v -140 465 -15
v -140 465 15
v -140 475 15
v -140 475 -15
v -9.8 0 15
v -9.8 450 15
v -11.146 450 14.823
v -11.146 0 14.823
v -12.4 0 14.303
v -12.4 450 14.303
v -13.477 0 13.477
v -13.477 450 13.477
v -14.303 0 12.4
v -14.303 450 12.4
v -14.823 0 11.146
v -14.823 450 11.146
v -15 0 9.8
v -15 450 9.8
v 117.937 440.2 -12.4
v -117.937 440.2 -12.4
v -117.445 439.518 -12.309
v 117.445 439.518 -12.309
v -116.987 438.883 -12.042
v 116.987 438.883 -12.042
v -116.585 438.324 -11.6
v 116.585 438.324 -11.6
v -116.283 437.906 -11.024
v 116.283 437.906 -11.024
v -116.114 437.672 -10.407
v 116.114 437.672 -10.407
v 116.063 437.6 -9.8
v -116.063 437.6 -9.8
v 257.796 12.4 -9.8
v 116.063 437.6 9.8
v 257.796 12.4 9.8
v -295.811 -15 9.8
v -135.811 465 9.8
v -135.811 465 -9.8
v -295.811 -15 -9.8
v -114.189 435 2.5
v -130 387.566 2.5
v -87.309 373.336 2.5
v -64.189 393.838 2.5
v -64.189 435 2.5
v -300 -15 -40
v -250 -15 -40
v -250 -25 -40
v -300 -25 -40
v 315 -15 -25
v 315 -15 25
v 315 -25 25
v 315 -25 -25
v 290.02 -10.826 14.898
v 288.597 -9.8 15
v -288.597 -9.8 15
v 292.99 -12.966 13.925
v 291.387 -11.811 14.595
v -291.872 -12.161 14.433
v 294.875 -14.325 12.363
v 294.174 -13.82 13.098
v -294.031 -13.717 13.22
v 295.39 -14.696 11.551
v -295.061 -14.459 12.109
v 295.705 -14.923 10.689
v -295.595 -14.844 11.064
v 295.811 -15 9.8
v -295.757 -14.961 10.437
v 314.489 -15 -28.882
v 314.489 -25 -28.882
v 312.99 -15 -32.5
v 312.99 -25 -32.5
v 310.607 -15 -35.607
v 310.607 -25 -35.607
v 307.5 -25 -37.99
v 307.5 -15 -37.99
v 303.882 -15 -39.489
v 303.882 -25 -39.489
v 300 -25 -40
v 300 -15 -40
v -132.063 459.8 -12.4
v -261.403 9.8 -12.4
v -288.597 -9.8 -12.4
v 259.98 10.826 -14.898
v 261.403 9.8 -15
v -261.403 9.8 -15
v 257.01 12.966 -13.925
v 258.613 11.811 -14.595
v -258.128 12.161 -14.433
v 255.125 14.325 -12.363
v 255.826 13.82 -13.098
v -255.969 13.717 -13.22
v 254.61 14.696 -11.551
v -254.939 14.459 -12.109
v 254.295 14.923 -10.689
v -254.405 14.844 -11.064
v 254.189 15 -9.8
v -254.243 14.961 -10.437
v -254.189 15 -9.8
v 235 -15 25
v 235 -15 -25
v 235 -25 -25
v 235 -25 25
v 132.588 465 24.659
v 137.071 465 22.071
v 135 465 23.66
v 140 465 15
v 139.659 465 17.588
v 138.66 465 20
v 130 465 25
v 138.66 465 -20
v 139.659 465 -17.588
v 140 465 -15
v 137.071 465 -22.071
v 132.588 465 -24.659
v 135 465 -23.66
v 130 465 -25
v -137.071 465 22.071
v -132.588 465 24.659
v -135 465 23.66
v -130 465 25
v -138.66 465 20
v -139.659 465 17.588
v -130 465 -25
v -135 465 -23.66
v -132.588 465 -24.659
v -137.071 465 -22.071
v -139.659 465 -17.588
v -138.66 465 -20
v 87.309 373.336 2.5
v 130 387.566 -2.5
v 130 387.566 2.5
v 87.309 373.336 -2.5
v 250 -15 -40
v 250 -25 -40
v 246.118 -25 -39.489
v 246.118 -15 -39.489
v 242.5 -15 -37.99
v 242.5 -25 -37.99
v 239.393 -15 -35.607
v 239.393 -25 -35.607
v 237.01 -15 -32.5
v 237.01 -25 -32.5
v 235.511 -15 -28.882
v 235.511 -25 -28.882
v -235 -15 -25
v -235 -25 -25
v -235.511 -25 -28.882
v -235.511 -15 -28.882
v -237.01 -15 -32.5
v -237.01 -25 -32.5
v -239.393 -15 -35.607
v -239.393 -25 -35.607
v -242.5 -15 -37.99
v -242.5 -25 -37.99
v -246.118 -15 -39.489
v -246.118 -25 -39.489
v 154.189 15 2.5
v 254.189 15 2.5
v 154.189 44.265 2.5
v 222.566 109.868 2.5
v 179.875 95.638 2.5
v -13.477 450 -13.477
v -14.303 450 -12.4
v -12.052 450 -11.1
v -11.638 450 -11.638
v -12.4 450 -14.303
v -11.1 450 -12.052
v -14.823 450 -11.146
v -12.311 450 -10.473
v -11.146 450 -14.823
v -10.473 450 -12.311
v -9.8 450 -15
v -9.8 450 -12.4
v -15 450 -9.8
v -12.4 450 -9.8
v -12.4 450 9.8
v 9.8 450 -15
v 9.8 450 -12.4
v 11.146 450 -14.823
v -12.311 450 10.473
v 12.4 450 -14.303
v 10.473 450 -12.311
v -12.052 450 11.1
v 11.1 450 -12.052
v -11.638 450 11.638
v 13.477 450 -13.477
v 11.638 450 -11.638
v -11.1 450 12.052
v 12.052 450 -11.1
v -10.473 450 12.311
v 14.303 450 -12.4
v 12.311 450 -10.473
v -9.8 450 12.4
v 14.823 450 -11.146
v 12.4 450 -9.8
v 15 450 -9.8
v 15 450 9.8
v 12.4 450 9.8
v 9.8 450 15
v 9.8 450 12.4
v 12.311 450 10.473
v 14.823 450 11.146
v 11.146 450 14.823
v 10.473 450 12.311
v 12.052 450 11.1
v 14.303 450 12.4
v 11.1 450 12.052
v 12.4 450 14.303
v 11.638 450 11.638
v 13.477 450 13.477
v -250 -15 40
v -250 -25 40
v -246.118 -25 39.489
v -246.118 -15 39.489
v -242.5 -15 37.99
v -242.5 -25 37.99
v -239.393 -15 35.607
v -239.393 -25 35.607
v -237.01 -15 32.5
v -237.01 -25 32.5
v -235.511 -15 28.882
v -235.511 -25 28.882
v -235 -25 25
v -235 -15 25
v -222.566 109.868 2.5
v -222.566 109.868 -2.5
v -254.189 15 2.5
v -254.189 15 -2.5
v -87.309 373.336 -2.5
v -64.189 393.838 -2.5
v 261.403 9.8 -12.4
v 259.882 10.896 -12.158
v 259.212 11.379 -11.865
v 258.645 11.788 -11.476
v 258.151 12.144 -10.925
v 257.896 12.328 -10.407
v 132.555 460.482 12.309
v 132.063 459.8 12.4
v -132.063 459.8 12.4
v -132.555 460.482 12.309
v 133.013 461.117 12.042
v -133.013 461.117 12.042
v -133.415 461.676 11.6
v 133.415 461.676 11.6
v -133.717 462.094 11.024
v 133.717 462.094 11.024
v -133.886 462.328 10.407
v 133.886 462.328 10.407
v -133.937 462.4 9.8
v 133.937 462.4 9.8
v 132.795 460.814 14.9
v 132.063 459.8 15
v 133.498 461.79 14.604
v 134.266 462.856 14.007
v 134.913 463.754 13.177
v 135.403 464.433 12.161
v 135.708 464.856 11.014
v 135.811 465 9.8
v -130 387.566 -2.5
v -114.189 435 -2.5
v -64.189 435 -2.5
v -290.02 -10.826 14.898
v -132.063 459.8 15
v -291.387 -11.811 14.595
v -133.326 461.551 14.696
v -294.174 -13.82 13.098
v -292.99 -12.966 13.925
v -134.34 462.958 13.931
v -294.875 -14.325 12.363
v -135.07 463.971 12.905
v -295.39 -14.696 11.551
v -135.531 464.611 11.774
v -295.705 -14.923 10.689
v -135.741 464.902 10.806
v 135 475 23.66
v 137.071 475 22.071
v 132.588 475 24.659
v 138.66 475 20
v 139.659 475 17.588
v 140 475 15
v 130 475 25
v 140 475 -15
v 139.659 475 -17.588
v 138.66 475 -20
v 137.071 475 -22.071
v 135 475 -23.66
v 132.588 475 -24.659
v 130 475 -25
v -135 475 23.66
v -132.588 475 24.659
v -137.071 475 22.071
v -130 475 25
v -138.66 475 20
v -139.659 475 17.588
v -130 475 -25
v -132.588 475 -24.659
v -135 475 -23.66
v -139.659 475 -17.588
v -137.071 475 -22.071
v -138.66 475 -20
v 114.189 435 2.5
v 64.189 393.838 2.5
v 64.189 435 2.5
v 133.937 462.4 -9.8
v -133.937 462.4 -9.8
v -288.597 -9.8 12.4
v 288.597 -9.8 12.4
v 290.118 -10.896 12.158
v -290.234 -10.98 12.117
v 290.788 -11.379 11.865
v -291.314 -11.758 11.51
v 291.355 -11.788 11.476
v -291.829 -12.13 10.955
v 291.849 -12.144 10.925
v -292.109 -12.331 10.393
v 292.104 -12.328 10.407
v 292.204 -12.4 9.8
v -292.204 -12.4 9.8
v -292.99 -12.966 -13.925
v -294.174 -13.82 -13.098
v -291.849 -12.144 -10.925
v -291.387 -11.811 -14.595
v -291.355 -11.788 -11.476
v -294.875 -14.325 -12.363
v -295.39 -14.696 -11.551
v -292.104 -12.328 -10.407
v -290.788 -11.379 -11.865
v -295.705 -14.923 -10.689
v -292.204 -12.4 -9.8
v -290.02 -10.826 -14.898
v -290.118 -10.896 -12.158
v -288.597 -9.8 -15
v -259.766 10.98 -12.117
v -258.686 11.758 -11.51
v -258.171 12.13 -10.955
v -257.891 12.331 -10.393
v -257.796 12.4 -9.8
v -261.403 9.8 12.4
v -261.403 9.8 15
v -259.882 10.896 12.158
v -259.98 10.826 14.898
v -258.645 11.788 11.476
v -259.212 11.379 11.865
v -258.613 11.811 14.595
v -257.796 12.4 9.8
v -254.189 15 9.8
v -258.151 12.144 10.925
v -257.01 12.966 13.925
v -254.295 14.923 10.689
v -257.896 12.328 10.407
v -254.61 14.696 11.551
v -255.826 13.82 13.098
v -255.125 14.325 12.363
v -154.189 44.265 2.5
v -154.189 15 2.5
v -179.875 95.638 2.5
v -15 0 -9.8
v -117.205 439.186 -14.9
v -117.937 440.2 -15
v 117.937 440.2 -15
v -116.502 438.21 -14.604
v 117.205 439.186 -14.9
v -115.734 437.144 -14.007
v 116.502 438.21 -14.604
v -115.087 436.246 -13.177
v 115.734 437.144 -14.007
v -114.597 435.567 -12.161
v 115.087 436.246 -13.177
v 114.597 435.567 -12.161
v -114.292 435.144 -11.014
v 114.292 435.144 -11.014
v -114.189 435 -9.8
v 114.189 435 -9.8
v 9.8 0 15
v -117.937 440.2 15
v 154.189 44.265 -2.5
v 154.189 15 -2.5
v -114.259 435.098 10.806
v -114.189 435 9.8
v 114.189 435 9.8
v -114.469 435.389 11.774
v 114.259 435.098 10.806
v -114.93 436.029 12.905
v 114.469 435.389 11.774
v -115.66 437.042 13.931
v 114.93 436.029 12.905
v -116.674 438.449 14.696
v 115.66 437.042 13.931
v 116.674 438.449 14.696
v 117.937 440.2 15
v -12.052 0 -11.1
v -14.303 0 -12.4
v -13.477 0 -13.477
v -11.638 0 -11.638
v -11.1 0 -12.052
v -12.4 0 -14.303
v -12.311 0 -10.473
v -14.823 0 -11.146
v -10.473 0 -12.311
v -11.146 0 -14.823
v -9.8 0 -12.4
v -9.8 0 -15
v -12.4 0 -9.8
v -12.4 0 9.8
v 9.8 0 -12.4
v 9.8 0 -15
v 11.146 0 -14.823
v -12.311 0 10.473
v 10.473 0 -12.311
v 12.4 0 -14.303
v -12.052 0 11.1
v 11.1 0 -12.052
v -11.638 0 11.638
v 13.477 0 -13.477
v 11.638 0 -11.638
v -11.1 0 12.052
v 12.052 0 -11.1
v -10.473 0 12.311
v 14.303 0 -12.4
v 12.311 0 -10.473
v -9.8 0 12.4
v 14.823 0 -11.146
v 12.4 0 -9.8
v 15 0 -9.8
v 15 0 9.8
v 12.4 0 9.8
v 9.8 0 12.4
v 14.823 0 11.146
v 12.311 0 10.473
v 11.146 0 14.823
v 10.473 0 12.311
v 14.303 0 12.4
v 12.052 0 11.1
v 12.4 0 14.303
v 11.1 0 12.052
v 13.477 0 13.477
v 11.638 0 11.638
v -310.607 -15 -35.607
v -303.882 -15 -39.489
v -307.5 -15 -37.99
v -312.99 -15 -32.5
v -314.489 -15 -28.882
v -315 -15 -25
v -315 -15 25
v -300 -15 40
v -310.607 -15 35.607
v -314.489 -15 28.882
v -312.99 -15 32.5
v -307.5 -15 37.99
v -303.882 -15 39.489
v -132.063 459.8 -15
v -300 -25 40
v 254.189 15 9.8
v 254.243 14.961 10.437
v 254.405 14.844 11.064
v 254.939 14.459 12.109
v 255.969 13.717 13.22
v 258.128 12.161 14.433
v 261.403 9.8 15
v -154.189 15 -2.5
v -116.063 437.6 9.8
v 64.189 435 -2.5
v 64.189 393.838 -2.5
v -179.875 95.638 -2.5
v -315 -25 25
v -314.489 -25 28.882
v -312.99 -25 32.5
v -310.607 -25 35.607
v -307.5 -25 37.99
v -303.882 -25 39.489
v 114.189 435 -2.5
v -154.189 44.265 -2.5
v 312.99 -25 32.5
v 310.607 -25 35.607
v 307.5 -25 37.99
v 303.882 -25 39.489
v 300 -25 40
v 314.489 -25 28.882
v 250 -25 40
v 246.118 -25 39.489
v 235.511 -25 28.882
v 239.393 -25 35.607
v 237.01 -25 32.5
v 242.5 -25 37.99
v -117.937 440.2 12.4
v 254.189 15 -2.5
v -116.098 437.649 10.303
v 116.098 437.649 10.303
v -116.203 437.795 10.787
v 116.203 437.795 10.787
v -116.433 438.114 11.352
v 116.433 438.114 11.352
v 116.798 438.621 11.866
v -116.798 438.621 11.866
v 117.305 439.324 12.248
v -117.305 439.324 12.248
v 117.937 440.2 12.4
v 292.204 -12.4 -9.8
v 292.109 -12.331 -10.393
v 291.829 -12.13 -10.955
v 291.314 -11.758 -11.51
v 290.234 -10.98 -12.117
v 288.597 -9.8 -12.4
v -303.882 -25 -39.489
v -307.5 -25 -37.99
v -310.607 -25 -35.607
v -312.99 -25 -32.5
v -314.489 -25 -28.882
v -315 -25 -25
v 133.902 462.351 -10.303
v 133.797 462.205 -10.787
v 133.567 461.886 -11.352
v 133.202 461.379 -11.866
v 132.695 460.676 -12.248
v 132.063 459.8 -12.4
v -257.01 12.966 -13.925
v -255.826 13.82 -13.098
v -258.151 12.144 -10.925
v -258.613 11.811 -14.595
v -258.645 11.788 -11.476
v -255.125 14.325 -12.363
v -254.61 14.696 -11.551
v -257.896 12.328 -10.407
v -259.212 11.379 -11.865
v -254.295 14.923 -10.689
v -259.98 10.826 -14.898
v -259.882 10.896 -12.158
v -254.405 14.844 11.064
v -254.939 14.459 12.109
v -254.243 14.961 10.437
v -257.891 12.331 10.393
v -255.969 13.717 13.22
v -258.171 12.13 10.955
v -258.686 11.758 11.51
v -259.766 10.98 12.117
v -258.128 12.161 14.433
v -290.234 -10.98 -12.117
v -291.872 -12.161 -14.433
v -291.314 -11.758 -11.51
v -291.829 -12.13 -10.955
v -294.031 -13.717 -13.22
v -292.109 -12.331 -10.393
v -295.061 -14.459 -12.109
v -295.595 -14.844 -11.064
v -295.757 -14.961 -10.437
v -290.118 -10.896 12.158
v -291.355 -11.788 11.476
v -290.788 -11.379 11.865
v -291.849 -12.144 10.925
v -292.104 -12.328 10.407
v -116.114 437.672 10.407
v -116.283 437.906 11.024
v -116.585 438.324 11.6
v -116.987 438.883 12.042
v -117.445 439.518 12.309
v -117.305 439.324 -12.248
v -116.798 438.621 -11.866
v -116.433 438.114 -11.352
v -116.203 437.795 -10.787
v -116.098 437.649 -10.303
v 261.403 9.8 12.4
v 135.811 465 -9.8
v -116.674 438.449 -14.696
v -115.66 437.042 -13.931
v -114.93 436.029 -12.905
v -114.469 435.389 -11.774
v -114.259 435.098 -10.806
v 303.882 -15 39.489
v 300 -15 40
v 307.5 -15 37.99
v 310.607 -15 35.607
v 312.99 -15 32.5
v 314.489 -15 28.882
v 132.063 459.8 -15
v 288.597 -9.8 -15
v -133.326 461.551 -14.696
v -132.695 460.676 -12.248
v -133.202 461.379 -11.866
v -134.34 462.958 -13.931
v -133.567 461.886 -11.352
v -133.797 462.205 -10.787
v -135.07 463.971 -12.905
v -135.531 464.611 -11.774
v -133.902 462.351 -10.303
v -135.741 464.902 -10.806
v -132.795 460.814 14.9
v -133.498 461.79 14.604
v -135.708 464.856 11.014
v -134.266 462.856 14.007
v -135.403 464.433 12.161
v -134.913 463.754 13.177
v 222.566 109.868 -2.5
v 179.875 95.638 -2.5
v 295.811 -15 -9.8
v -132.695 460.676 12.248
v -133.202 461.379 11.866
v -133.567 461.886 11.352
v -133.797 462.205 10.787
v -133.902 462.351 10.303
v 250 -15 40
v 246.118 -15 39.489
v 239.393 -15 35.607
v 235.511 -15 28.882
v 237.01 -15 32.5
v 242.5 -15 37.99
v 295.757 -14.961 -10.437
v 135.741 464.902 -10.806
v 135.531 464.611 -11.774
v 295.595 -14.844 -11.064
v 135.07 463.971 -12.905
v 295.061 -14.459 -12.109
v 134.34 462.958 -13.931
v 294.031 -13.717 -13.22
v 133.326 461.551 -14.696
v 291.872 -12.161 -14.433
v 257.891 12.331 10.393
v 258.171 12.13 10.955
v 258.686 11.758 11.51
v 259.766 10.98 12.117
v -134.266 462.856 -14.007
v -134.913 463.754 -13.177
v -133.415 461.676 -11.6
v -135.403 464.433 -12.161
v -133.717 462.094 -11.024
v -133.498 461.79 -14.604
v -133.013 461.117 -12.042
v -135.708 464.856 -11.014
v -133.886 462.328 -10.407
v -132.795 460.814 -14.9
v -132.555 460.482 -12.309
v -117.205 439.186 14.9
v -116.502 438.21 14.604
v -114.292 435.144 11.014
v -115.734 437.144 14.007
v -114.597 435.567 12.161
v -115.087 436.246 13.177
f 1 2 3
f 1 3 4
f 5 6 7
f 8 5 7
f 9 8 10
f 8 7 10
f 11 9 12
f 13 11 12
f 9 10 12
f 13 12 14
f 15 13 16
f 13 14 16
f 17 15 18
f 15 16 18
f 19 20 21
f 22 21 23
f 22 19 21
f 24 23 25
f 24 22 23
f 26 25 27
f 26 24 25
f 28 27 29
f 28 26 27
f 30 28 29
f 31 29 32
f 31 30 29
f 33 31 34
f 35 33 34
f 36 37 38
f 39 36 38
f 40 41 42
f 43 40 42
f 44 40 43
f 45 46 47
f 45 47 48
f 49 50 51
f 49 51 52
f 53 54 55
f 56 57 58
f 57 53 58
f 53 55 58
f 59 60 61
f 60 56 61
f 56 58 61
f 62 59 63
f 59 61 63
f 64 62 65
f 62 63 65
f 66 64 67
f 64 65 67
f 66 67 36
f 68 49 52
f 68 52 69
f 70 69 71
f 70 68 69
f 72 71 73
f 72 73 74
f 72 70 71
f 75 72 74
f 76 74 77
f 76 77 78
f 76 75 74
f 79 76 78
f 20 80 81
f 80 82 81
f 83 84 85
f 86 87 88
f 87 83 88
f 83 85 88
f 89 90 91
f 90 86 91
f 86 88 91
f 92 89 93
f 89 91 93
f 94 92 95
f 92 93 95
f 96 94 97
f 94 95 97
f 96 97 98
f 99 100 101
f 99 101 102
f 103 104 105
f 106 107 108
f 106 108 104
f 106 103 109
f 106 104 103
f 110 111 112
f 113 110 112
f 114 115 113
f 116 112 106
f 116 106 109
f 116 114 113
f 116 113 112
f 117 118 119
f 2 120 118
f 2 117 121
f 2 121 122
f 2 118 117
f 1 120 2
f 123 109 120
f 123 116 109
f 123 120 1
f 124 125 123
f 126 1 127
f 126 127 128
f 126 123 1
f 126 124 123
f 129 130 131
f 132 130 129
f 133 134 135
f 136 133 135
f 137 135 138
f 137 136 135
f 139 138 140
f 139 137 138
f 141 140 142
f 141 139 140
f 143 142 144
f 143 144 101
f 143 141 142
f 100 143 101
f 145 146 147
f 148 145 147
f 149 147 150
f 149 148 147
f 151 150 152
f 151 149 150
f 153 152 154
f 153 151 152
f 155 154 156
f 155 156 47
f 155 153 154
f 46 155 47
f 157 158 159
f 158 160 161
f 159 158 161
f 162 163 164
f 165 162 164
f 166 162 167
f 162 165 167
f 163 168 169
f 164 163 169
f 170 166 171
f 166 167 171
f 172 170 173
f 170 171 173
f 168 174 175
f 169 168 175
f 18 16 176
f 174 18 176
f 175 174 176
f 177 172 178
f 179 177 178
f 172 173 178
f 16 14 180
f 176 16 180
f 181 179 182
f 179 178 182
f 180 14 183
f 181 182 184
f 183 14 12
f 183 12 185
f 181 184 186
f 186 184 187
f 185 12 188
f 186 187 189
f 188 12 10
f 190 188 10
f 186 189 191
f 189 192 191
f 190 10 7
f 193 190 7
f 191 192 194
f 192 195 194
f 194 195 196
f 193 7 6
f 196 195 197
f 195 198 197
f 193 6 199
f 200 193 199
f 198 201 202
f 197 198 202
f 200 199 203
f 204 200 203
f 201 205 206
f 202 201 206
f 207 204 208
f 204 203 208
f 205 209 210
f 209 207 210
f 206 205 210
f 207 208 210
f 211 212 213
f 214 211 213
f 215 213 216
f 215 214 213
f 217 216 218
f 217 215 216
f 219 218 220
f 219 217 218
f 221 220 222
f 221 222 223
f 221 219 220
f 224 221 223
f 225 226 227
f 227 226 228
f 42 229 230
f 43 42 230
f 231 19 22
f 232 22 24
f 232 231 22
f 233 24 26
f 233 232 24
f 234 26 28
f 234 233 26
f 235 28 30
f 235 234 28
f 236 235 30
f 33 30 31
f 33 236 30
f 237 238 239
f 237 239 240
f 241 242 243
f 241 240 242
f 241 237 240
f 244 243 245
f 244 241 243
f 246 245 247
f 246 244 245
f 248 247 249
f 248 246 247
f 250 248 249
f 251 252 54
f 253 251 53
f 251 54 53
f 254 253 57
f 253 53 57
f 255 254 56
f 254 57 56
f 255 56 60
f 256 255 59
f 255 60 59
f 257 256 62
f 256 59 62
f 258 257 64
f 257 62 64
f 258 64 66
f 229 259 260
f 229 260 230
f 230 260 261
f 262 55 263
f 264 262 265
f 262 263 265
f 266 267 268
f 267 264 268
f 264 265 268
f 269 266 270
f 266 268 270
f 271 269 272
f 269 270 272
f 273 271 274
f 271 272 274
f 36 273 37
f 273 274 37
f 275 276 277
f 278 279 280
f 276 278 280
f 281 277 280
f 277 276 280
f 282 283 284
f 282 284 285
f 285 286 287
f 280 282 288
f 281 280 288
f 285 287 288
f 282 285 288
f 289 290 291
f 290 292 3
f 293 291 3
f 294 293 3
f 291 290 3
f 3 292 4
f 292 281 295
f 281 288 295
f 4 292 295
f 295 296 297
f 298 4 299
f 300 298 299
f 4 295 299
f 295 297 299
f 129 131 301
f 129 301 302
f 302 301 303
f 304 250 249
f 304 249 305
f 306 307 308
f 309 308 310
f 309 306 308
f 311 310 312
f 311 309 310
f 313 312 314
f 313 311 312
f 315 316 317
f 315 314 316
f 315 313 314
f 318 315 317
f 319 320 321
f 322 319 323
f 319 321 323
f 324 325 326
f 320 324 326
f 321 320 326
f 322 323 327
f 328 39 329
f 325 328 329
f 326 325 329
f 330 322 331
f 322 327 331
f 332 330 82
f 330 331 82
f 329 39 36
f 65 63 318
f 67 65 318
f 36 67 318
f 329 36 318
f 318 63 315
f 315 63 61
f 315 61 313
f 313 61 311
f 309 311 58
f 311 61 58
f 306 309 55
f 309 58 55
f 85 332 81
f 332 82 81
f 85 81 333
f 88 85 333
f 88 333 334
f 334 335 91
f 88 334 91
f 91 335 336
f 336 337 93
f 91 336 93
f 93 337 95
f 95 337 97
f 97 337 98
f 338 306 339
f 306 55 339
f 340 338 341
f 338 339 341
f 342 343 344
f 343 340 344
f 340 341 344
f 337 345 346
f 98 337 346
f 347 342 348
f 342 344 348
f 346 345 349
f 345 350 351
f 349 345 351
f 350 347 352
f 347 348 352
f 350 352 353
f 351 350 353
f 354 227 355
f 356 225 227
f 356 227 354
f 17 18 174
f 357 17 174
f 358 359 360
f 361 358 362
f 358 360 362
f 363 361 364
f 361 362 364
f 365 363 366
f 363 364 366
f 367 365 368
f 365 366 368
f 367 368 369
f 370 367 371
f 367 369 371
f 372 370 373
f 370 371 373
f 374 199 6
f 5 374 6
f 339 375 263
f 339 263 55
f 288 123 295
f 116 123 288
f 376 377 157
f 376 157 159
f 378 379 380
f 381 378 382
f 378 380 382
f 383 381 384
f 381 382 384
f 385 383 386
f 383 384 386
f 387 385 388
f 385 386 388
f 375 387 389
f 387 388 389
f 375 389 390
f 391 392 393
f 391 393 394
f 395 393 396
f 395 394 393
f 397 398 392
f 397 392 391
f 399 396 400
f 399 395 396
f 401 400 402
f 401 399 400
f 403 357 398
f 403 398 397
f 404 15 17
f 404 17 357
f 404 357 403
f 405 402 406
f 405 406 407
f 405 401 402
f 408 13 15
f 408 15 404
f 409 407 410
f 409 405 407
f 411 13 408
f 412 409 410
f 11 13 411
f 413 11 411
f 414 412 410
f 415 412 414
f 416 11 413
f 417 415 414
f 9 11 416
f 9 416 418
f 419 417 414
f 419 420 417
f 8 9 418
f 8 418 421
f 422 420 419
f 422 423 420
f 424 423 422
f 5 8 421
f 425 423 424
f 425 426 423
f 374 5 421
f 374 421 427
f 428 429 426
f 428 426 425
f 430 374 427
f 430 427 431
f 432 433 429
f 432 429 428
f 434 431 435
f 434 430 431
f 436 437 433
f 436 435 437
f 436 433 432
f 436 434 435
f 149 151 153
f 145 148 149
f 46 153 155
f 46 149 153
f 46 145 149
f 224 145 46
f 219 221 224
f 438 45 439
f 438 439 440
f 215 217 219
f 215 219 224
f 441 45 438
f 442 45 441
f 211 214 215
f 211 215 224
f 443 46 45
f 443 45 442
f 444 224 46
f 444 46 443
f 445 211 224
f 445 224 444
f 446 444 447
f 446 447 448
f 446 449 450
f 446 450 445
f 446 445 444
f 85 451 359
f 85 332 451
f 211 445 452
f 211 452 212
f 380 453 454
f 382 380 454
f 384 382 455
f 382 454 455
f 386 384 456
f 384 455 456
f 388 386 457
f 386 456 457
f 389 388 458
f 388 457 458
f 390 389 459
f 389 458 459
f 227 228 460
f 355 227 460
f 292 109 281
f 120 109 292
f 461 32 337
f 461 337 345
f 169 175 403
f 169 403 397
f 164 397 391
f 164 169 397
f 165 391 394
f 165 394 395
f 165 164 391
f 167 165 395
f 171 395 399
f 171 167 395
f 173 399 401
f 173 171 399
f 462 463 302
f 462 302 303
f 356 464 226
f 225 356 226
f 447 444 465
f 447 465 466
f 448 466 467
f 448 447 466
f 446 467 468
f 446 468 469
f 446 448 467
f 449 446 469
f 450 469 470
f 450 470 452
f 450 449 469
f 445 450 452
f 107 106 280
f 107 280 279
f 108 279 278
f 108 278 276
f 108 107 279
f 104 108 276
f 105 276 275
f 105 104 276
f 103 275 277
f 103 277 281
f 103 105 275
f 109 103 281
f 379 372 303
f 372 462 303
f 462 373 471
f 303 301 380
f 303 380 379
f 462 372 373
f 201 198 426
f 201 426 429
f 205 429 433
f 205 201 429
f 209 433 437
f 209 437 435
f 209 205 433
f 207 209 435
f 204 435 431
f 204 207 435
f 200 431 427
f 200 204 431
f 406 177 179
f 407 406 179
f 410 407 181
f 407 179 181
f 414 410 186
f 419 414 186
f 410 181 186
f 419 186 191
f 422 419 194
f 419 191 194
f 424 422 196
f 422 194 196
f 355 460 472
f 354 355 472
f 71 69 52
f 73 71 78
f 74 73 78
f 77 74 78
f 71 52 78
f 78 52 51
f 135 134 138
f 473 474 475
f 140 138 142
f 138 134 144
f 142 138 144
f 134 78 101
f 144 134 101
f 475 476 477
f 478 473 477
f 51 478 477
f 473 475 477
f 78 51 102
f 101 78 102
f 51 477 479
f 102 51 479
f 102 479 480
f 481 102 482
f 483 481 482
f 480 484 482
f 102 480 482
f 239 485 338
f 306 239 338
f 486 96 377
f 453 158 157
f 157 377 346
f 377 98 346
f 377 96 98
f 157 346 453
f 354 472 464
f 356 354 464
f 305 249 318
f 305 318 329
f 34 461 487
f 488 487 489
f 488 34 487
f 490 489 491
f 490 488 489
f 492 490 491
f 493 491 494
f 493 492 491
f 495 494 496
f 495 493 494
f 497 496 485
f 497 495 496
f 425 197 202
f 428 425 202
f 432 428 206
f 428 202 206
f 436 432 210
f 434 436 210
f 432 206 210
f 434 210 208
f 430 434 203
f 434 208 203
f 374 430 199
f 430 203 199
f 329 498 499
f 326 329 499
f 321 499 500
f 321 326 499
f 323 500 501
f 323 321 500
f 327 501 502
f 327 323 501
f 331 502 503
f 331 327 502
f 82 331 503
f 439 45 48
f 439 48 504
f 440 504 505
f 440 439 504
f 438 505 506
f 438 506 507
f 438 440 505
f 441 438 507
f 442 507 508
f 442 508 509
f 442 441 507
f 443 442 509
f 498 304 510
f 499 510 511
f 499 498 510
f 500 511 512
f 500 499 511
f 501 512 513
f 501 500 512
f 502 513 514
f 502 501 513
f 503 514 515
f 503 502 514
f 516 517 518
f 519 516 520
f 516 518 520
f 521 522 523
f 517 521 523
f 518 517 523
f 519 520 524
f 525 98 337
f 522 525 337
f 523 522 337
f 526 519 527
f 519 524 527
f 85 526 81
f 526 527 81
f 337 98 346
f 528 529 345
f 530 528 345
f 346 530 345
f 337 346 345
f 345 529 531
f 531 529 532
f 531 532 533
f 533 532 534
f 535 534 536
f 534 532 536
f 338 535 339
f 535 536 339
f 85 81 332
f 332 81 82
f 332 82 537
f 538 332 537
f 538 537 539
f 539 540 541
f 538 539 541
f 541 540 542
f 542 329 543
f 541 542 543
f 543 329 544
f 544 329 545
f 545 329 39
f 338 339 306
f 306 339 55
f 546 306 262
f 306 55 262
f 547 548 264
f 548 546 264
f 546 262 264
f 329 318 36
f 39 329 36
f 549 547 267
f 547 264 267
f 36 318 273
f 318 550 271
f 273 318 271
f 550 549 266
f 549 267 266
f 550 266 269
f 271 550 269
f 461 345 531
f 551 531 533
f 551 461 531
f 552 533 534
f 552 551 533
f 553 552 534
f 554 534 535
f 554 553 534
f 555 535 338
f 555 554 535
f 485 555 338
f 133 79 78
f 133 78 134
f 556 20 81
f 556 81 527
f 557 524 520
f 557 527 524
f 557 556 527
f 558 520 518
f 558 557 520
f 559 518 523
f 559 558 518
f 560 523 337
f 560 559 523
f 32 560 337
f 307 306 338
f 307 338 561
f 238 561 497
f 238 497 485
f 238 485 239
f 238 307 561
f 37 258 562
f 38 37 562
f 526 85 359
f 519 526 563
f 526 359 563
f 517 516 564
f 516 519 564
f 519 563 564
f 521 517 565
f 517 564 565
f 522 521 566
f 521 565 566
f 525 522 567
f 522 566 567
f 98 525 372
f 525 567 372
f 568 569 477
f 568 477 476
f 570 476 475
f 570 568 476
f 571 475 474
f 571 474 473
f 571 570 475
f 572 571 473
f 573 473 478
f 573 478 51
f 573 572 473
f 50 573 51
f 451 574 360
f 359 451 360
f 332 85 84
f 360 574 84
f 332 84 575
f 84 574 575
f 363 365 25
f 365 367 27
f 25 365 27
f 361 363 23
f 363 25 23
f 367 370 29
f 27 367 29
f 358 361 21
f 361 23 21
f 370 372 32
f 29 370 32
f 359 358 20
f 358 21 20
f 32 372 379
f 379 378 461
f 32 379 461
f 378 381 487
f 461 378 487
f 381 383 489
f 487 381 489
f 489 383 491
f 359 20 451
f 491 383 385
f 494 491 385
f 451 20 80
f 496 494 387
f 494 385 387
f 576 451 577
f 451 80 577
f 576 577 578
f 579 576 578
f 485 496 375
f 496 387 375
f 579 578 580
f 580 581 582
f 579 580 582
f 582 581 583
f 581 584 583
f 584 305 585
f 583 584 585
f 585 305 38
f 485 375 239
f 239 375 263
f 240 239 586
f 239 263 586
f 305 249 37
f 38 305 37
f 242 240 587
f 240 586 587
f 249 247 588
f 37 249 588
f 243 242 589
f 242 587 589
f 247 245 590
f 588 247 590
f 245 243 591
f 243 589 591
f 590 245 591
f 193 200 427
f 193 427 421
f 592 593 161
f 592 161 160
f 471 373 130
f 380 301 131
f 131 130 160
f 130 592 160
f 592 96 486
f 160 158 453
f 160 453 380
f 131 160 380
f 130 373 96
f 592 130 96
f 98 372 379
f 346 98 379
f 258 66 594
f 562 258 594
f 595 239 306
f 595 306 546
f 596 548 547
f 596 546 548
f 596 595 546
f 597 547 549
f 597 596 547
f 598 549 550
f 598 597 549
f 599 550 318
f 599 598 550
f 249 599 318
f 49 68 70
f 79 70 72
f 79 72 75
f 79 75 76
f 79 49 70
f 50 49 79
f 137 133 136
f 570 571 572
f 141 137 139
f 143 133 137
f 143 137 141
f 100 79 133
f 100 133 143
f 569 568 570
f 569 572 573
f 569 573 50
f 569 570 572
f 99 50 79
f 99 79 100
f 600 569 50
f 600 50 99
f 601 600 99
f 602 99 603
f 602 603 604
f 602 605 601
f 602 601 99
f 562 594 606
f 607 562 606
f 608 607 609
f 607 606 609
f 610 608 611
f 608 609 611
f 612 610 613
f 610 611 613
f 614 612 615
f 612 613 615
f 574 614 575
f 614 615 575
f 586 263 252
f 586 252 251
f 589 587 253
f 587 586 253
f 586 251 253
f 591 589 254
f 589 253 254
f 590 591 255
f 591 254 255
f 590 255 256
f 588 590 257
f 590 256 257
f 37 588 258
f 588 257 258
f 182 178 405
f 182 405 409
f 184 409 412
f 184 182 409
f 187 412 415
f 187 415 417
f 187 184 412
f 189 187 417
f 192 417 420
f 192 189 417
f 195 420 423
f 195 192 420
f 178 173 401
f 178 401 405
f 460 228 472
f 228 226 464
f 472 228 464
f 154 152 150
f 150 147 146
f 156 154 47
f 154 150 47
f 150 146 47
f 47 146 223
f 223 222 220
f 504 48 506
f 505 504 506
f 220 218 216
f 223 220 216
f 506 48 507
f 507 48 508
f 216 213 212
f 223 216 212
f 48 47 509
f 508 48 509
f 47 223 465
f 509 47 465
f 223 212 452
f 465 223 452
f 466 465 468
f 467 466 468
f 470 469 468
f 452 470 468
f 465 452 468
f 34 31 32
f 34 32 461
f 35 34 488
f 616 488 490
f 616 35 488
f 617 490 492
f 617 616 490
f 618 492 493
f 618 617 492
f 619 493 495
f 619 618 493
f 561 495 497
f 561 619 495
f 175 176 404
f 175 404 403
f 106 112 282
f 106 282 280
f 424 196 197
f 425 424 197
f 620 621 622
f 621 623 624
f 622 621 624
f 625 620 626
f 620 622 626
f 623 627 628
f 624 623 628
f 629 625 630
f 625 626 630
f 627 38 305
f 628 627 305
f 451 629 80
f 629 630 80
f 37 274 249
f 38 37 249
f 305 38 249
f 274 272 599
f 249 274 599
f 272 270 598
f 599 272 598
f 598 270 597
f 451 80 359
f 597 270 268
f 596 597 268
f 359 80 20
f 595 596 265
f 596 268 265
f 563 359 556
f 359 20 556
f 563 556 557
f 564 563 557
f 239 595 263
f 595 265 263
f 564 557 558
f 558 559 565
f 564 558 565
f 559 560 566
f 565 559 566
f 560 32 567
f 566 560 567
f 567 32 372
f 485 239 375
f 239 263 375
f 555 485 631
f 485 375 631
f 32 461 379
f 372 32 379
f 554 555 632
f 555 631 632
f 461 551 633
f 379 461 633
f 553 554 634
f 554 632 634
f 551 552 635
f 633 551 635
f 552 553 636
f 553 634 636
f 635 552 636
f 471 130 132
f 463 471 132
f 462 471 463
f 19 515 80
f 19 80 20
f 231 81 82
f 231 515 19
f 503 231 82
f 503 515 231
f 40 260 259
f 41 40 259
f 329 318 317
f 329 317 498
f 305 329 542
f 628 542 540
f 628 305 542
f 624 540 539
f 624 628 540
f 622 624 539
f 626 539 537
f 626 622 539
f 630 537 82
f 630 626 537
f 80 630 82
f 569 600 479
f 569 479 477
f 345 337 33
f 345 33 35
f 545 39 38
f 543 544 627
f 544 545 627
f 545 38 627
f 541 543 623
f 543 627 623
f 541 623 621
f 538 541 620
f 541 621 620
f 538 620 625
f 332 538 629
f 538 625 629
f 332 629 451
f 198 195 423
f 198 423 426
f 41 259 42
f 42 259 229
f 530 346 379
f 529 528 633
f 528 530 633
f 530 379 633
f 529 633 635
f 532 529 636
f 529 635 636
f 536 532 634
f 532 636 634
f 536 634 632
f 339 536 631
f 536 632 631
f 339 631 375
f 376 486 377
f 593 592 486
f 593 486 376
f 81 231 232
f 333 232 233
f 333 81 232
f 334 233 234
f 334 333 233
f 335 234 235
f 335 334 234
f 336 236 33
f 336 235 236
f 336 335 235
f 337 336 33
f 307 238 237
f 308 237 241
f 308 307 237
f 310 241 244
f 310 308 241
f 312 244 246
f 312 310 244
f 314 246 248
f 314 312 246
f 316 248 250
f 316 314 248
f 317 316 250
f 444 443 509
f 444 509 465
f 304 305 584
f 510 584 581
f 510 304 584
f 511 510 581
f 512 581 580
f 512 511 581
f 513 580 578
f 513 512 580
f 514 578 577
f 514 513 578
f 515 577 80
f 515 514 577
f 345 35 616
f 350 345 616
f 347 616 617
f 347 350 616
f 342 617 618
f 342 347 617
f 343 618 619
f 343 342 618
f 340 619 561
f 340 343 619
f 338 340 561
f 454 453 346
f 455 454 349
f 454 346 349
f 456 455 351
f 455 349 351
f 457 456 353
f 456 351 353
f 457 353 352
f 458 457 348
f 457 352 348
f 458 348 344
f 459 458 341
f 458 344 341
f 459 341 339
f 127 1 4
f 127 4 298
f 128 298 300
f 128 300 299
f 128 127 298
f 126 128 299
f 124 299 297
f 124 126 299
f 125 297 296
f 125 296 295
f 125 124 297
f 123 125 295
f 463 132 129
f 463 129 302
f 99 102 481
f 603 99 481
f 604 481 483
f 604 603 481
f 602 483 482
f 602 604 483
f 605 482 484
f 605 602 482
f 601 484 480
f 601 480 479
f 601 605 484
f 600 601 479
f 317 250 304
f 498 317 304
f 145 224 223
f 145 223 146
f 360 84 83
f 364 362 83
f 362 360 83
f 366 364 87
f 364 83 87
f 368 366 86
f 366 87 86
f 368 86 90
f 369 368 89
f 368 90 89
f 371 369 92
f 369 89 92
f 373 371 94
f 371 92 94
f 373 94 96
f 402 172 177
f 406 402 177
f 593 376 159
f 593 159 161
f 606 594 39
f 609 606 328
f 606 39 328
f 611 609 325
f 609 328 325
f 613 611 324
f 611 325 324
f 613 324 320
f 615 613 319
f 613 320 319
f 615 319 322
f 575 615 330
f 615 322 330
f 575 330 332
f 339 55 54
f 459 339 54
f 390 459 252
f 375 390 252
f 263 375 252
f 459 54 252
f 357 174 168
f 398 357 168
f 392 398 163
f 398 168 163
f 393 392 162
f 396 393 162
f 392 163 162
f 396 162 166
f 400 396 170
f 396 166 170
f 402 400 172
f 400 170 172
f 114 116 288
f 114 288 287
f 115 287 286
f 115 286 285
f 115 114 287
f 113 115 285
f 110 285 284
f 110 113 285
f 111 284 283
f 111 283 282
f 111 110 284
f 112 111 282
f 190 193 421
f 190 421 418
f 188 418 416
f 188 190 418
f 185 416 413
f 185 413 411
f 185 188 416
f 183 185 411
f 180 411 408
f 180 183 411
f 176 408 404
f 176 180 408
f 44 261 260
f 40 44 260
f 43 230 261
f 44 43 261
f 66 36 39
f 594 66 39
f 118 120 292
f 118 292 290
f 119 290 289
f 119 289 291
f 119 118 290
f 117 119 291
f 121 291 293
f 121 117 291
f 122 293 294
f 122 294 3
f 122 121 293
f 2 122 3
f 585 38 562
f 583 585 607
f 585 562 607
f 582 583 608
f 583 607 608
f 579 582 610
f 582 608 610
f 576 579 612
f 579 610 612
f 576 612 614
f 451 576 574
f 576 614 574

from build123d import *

# Parameters (mm, degrees)
SQUARE_TUBE_30_X_30_X_2_6_1_DEPTH      = 504.773396612
SQUARE_TUBE_30_X_30_X_2_6_1_DEPTH_BACK = 16.289611963
SQUARE_TUBE_30_X_30_X_2_6_1_2_DEPTH    = 610.863495174
SQUARE_TUBE_30_X_30_X_2_6_1_3_DEPTH    = 521.063008575
SQUARE_TUBE_30_X_30_X_2_6_1_4_DEPTH    = 282.579223926
BOSS_EXTRUDE1_DEPTH                    = 10
BOSS_EXTRUDE1_2_DEPTH                  = 10
BOSS_EXTRUDE2_DEPTH                    = 10
GUSSET1_START                          = -2.5
GUSSET1_DEPTH                          = 5
GUSSET2_START                          = -2.5
GUSSET2_DEPTH                          = 5
SQUARE_TUBE_30_X_30_X_2_6_2_DEPTH      = 450


# Read off the part's stored shape, not the designer's step: Gusset1, Gusset2
with BuildPart() as part:
    # Sketch11 → Square tube 30 X 30 X 2.6(1) (new, two sides: drawn at the far end of the back side and taken through both)
    with BuildSketch(Plane(origin=(-125, 450, 0), x_dir=(0.9486832980505138, -0.3162277660168379, 0), z_dir=(-0.31622776601683794, -0.9486832980505139, 0)).offset(-SQUARE_TUBE_30_X_30_X_2_6_1_DEPTH_BACK)):
        with BuildLine():
            Line((-9.8, -15), (9.8, -15))
            ThreePointArc((9.8, -15), (13.476955262, -13.476955262), (15, -9.8))
            Line((15, -9.8), (15, 9.8))
            ThreePointArc((15, 9.8), (13.476955262, 13.476955262), (9.8, 15))
            Line((9.8, 15), (-9.8, 15))
            ThreePointArc((-9.8, 15), (-13.476955262, 13.476955262), (-15, 9.8))
            Line((-15, 9.8), (-15, -9.8))
            ThreePointArc((-15, -9.8), (-13.476955262, -13.476955262), (-9.8, -15))
        make_face()
        with BuildLine():
            Line((-9.8, -12.4), (9.8, -12.4))
            ThreePointArc((9.8, -12.4), (11.638477631, -11.638477631), (12.4, -9.8))
            Line((12.4, -9.8), (12.4, 9.8))
            ThreePointArc((12.4, 9.8), (11.638477631, 11.638477631), (9.8, 12.4))
            Line((9.8, 12.4), (-9.8, 12.4))
            ThreePointArc((-9.8, 12.4), (-11.638477631, 11.638477631), (-12.4, 9.8))
            Line((-12.4, 9.8), (-12.4, -9.8))
            ThreePointArc((-12.4, -9.8), (-11.638477631, -11.638477631), (-9.8, -12.4))
        make_face(mode=Mode.SUBTRACT)
    extrude(amount=SQUARE_TUBE_30_X_30_X_2_6_1_DEPTH + SQUARE_TUBE_30_X_30_X_2_6_1_DEPTH_BACK)

    # Square tube 30 X 30 X 2.6(1) mitre 1
    split(bisect_by=Plane(origin=(-125, 450, 0), x_dir=(0.584710285, -0.811242185, 0), z_dir=(-0.811242185, -0.584710285, 0)), keep=Keep.TOP)

    # Square tube 30 X 30 X 2.6(1) mitre 2
    split(bisect_by=Plane(origin=(-275, 0, 0), x_dir=(-0.811242185, -0.584710285, 0), z_dir=(-0.584710285, 0.811242185, 0)), keep=Keep.TOP)


with BuildPart() as body_2:
    # Sketch11 on segment 2 (carried to segment 2) → Square tube 30 X 30 X 2.6_1 2 (new body)
    with BuildSketch(Plane.YZ.offset(-305.431747587)):
        with BuildLine():
            Line((-9.8, -15), (9.8, -15))
            ThreePointArc((9.8, -15), (13.476955262, -13.476955262), (15, -9.8))
            Line((15, -9.8), (15, 9.8))
            ThreePointArc((15, 9.8), (13.476955262, 13.476955262), (9.8, 15))
            Line((9.8, 15), (-9.8, 15))
            ThreePointArc((-9.8, 15), (-13.476955262, 13.476955262), (-15, 9.8))
            Line((-15, 9.8), (-15, -9.8))
            ThreePointArc((-15, -9.8), (-13.476955262, -13.476955262), (-9.8, -15))
        make_face()
        with BuildLine():
            Line((-9.8, -12.4), (9.8, -12.4))
            ThreePointArc((9.8, -12.4), (11.638477631, -11.638477631), (12.4, -9.8))
            Line((12.4, -9.8), (12.4, 9.8))
            ThreePointArc((12.4, 9.8), (11.638477631, 11.638477631), (9.8, 12.4))
            Line((9.8, 12.4), (-9.8, 12.4))
            ThreePointArc((-9.8, 12.4), (-11.638477631, 11.638477631), (-12.4, 9.8))
            Line((-12.4, 9.8), (-12.4, -9.8))
            ThreePointArc((-12.4, -9.8), (-11.638477631, -11.638477631), (-9.8, -12.4))
        make_face(mode=Mode.SUBTRACT)
    extrude(amount=SQUARE_TUBE_30_X_30_X_2_6_1_2_DEPTH)

    # Square tube 30 X 30 X 2.6_1 2 mitre 1
    split(bisect_by=Plane(origin=(-275, 0, 0), x_dir=(0.811242185, 0.584710285, 0), z_dir=(0.584710285, -0.811242185, 0)), keep=Keep.TOP)

    # Square tube 30 X 30 X 2.6_1 2 mitre 2
    split(bisect_by=Plane(origin=(275, 0, 0), x_dir=(0.811242185, -0.584710285, 0), z_dir=(-0.584710285, -0.811242185, 0)), keep=Keep.TOP)


with BuildPart() as body_3:
    # Sketch11 on segment 3 (carried to segment 3) → Square tube 30 X 30 X 2.6_1 3 (new body)
    with BuildSketch(Plane(origin=(284.623363555, -28.870090666, 0), x_dir=(-0.948683298, -0.316227766, 0), z_dir=(-0.316227766, 0.948683298, 0))):
        with BuildLine():
            Line((-9.8, -15), (9.8, -15))
            ThreePointArc((9.8, -15), (13.476955262, -13.476955262), (15, -9.8))
            Line((15, -9.8), (15, 9.8))
            ThreePointArc((15, 9.8), (13.476955262, 13.476955262), (9.8, 15))
            Line((9.8, 15), (-9.8, 15))
            ThreePointArc((-9.8, 15), (-13.476955262, 13.476955262), (-15, 9.8))
            Line((-15, 9.8), (-15, -9.8))
            ThreePointArc((-15, -9.8), (-13.476955262, -13.476955262), (-9.8, -15))
        make_face()
        with BuildLine():
            Line((-9.8, -12.4), (9.8, -12.4))
            ThreePointArc((9.8, -12.4), (11.638477631, -11.638477631), (12.4, -9.8))
            Line((12.4, -9.8), (12.4, 9.8))
            ThreePointArc((12.4, 9.8), (11.638477631, 11.638477631), (9.8, 12.4))
            Line((9.8, 12.4), (-9.8, 12.4))
            ThreePointArc((-9.8, 12.4), (-11.638477631, 11.638477631), (-12.4, 9.8))
            Line((-12.4, 9.8), (-12.4, -9.8))
            ThreePointArc((-12.4, -9.8), (-11.638477631, -11.638477631), (-9.8, -12.4))
        make_face(mode=Mode.SUBTRACT)
    extrude(amount=SQUARE_TUBE_30_X_30_X_2_6_1_3_DEPTH)

    # Square tube 30 X 30 X 2.6_1 3 mitre 1
    split(bisect_by=Plane(origin=(275, 0, 0), x_dir=(-0.811242185, 0.584710285, 0), z_dir=(0.584710285, 0.811242185, 0)), keep=Keep.TOP)

    # Square tube 30 X 30 X 2.6_1 3 mitre 2
    split(bisect_by=Plane(origin=(125, 450, 0), x_dir=(0.584710285, 0.811242185, 0), z_dir=(0.811242185, -0.584710285, 0)), keep=Keep.TOP)


with BuildPart() as body_4:
    # Sketch11 on segment 4 (carried to segment 4) → Square tube 30 X 30 X 2.6_1 4 (new body)
    with BuildSketch(Plane(origin=(141.289611963, 450, 0), x_dir=(0, -1, 0), z_dir=(-1, 0, 0))):
        with BuildLine():
            Line((-9.8, -15), (9.8, -15))
            ThreePointArc((9.8, -15), (13.476955262, -13.476955262), (15, -9.8))
            Line((15, -9.8), (15, 9.8))
            ThreePointArc((15, 9.8), (13.476955262, 13.476955262), (9.8, 15))
            Line((9.8, 15), (-9.8, 15))
            ThreePointArc((-9.8, 15), (-13.476955262, 13.476955262), (-15, 9.8))
            Line((-15, 9.8), (-15, -9.8))
            ThreePointArc((-15, -9.8), (-13.476955262, -13.476955262), (-9.8, -15))
        make_face()
        with BuildLine():
            Line((-9.8, -12.4), (9.8, -12.4))
            ThreePointArc((9.8, -12.4), (11.638477631, -11.638477631), (12.4, -9.8))
            Line((12.4, -9.8), (12.4, 9.8))
            ThreePointArc((12.4, 9.8), (11.638477631, 11.638477631), (9.8, 12.4))
            Line((9.8, 12.4), (-9.8, 12.4))
            ThreePointArc((-9.8, 12.4), (-11.638477631, 11.638477631), (-12.4, 9.8))
            Line((-12.4, 9.8), (-12.4, -9.8))
            ThreePointArc((-12.4, -9.8), (-11.638477631, -11.638477631), (-9.8, -12.4))
        make_face(mode=Mode.SUBTRACT)
    extrude(amount=SQUARE_TUBE_30_X_30_X_2_6_1_4_DEPTH)

    # Square tube 30 X 30 X 2.6_1 4 mitre 1
    split(bisect_by=Plane(origin=(125, 450, 0), x_dir=(-0.584710285, -0.811242185, 0), z_dir=(-0.811242185, 0.584710285, 0)), keep=Keep.TOP)

    # Square tube 30 X 30 X 2.6_1 4 mitre 2
    split(bisect_by=Plane(origin=(-125, 450, 0), x_dir=(-0.584710285, 0.811242185, 0), z_dir=(0.811242185, 0.584710285, 0)), keep=Keep.TOP)


with BuildPart() as body_5:
    # Sketch12 → Boss-Extrude1 (new body)
    with BuildSketch(Plane.XZ.offset(15)):
        with BuildLine():
            Line((-300, 40), (-250, 40))
            ThreePointArc((-250, 40), (-239.393398282, 35.606601718), (-235, 25))
            Line((-235, 25), (-235, -25))
            ThreePointArc((-235, -25), (-239.393398282, -35.606601718), (-250, -40))
            Line((-250, -40), (-300, -40))
            ThreePointArc((-300, -40), (-310.606601718, -35.606601718), (-315, -25))
            Line((-315, -25), (-315, 25))
            ThreePointArc((-315, 25), (-310.606601718, 35.606601718), (-300, 40))
        make_face()
    extrude(amount=BOSS_EXTRUDE1_DEPTH)


with BuildPart() as body_6:
    # Sketch12 → Boss-Extrude1 2 (new body)
    with BuildSketch(Plane.XZ.offset(15)):
        with BuildLine():
            Line((250, 40), (300, 40))
            ThreePointArc((300, 40), (310.606601718, 35.606601718), (315, 25))
            Line((315, 25), (315, -25))
            ThreePointArc((315, -25), (310.606601718, -35.606601718), (300, -40))
            Line((300, -40), (250, -40))
            ThreePointArc((250, -40), (239.393398282, -35.606601718), (235, -25))
            Line((235, -25), (235, 25))
            ThreePointArc((235, 25), (239.393398282, 35.606601718), (250, 40))
        make_face()
    extrude(amount=BOSS_EXTRUDE1_2_DEPTH)


with BuildPart() as body_7:
    # Sketch13 → Boss-Extrude2 (new body)
    with BuildSketch(Plane(origin=(0, 465, 0), x_dir=(1, 0, 0), z_dir=(0, 1, 0))):
        with BuildLine():
            Line((-130, 25), (130, 25))
            ThreePointArc((130, 25), (137.071067812, 22.071067812), (140, 15))
            Line((140, 15), (140, -15))
            ThreePointArc((140, -15), (137.071067812, -22.071067812), (130, -25))
            Line((130, -25), (-130, -25))
            ThreePointArc((-130, -25), (-137.071067812, -22.071067812), (-140, -15))
            Line((-140, -15), (-140, 15))
            ThreePointArc((-140, 15), (-137.071067812, 22.071067812), (-130, 25))
        make_face()
    extrude(amount=BOSS_EXTRUDE2_DEPTH)


with BuildPart() as body_8:
    # Gusset1 outline → Gusset1 (new body)
    with BuildSketch(Plane.XY.offset(GUSSET1_START)):
        Polygon((-179.875086685, 95.638080334), (-222.565835097, 109.868329805), (-254.188611699, 15), (-154.188611699, 15), (-154.188611699, 44.265130362), align=None)
    gusset1 = extrude(amount=GUSSET1_DEPTH)


with BuildPart() as body_9:
    # Gusset2 outline → Gusset2 (new body)
    with BuildSketch(Plane.XY.offset(GUSSET2_START)):
        Polygon((-130, 387.565835097), (-87.309251588, 373.335585627), (-64.188611699, 393.837844167), (-64.188611699, 435), (-114.188611699, 435), align=None)
    gusset2 = extrude(amount=GUSSET2_DEPTH)


with BuildPart() as body_2_1:
    add(body_2.part)

    add(body_3.part)  # Mirror1 merges body 3

    add(body_4.part)  # Mirror1 merges body 4
    # Mirror1: Gusset1, Gusset2 across plane
    add(gusset1.mirror(Plane(origin=(0, 0, 0), x_dir=(0, 0, 1), z_dir=(1, 0, 0))))
    add(gusset2.mirror(Plane(origin=(0, 0, 0), x_dir=(0, 0, 1), z_dir=(1, 0, 0))))


with BuildPart() as body_8_2:
    # Sketch141 → Square tube 30 X 30 X 2.6(2) (new body)
    with BuildSketch(Plane.XZ.offset(-450)):
        with BuildLine():
            Line((-9.8, -15), (9.8, -15))
            ThreePointArc((9.8, -15), (13.476955262, -13.476955262), (15, -9.8))
            Line((15, -9.8), (15, 9.8))
            ThreePointArc((15, 9.8), (13.476955262, 13.476955262), (9.8, 15))
            Line((9.8, 15), (-9.8, 15))
            ThreePointArc((-9.8, 15), (-13.476955262, 13.476955262), (-15, 9.8))
            Line((-15, 9.8), (-15, -9.8))
            ThreePointArc((-15, -9.8), (-13.476955262, -13.476955262), (-9.8, -15))
        make_face()
        with BuildLine():
            Line((-9.8, -12.4), (9.8, -12.4))
            ThreePointArc((9.8, -12.4), (11.638477631, -11.638477631), (12.4, -9.8))
            Line((12.4, -9.8), (12.4, 9.8))
            ThreePointArc((12.4, 9.8), (11.638477631, 11.638477631), (9.8, 12.4))
            Line((9.8, 12.4), (-9.8, 12.4))
            ThreePointArc((-9.8, 12.4), (-11.638477631, 11.638477631), (-12.4, 9.8))
            Line((-12.4, 9.8), (-12.4, -9.8))
            ThreePointArc((-12.4, -9.8), (-11.638477631, -11.638477631), (-9.8, -12.4))
        make_face(mode=Mode.SUBTRACT)
    extrude(amount=SQUARE_TUBE_30_X_30_X_2_6_2_DEPTH)


solid = Compound([part.part, body_5.part, body_6.part, body_7.part, body_8.part, body_9.part, body_2_1.part, body_8_2.part])
